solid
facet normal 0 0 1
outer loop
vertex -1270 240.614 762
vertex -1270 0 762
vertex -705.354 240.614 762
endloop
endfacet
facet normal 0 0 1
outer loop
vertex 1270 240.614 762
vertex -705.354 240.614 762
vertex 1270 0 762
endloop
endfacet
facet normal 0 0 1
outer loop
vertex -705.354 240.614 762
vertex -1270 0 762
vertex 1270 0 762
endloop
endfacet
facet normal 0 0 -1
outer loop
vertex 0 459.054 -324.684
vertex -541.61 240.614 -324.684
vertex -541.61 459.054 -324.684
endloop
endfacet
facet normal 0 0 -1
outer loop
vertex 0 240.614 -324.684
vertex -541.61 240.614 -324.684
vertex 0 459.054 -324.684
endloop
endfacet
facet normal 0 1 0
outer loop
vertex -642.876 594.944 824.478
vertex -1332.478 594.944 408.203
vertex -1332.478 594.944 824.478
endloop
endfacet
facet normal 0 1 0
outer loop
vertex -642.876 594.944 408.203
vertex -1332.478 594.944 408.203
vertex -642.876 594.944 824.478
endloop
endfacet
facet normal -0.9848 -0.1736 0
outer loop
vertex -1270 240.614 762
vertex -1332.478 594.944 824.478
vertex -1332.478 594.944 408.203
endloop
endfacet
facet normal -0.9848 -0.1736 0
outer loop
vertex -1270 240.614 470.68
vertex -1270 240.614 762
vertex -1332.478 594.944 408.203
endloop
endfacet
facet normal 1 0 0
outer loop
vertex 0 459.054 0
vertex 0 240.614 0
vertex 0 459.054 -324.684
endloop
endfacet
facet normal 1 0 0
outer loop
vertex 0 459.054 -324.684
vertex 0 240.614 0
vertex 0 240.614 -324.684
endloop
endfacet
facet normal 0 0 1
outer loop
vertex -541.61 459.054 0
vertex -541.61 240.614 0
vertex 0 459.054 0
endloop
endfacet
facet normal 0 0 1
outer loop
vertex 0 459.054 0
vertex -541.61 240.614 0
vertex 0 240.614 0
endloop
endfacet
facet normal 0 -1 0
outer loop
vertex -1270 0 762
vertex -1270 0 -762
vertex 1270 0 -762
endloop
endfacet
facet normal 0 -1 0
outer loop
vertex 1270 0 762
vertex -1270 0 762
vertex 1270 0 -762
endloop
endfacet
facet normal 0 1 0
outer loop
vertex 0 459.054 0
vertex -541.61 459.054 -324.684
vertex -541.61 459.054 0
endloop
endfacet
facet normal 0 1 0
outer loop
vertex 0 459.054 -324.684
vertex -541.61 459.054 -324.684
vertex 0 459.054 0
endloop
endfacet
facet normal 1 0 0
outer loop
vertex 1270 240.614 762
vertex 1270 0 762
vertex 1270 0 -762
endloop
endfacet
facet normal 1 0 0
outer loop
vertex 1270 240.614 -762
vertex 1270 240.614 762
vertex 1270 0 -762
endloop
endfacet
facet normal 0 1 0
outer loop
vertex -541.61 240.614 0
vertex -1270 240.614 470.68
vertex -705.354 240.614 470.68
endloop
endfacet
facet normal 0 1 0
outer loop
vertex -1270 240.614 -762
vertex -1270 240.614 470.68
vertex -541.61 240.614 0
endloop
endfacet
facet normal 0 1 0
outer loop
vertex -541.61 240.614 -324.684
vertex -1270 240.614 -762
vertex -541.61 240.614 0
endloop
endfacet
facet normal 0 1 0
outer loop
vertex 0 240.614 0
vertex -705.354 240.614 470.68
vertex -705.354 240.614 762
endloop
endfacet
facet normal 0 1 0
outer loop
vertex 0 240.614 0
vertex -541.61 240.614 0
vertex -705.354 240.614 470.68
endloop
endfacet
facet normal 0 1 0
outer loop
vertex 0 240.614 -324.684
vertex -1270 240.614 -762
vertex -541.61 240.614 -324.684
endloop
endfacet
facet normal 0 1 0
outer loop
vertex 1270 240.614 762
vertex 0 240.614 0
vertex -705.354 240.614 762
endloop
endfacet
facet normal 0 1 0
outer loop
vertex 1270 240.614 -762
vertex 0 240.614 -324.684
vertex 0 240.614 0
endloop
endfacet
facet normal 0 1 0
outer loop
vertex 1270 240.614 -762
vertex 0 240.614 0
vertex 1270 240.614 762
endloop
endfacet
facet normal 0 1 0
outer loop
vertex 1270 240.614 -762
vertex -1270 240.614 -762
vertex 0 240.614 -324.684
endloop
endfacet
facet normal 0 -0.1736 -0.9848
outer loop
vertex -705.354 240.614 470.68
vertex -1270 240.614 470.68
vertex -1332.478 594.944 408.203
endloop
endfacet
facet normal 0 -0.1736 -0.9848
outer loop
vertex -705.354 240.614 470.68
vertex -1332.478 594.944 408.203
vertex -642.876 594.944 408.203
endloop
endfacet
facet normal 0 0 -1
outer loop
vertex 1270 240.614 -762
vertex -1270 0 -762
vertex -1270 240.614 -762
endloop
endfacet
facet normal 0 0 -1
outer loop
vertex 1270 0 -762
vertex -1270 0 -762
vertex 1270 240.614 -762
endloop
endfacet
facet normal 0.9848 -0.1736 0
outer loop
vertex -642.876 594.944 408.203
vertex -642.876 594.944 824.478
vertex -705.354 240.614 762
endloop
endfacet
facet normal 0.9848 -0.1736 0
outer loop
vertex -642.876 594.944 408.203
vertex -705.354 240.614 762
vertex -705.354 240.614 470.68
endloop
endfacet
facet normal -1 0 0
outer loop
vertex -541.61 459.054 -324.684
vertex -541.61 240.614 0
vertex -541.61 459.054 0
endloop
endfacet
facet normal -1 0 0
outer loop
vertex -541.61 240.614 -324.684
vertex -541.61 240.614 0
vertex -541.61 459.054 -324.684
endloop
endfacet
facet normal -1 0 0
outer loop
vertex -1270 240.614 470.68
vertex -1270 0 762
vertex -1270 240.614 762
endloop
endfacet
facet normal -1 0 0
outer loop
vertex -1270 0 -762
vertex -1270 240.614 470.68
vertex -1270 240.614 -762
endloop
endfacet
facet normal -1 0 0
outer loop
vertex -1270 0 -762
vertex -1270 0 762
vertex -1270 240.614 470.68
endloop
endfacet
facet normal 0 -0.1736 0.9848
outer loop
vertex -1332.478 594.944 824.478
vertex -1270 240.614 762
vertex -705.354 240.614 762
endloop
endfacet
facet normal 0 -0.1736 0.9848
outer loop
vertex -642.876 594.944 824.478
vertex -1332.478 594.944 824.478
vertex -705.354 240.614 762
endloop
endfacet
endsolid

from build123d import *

# Parameters (mm, degrees)
SKETCH3_W           = 2540
SKETCH3_H           = 1524
BOSS_EXTRUDE3_DEPTH = 240.614231141
SKETCH4_W           = 564.645959203
SKETCH4_H           = 291.319549464
BOSS_EXTRUDE4_DEPTH = 354.33
BOSS_EXTRUDE4_DRAFT = -10
SKETCH9_W           = 541.61009367
SKETCH9_H           = 324.683710249
BOSS_EXTRUDE5_DEPTH = 218.44


with BuildPart() as part:
    # Sketch3 → Boss-Extrude3 (new body)
    with BuildSketch(Plane(origin=(0, 0, 0), x_dir=(1, 0, 0), z_dir=(0, 1, 0))):
        Rectangle(SKETCH3_W, SKETCH3_H)
    extrude(amount=BOSS_EXTRUDE3_DEPTH)


with BuildPart() as boss_extrude4_tool:
    # Sketch4 → Boss-Extrude4 (with draft: the straight prism first)
    with BuildSketch(Plane(origin=(0, 240.614231141, 0), x_dir=(1, 0, 0), z_dir=(0, 1, 0))):
        with Locations((-987.677020398, -616.340225268)):
            Rectangle(SKETCH4_W, SKETCH4_H)
    extrude(amount=BOSS_EXTRUDE4_DEPTH)
    # Boss-Extrude4: the draft: its side faces are tilted about the plane it starts from
    boss_extrude4_sides = [boss_extrude4_tool.faces().sort_by_distance(p)[0] for p in [
        (-987.677020399, 417.779231141, 762),
        (-705.354040797, 417.779231141, 616.340225268),
        (-987.677020399, 417.779231141, 470.680450536),
        (-1270, 417.779231141, 616.340225268),
    ]]
    draft(boss_extrude4_sides, Plane(origin=(0, 240.614231141, 0), x_dir=(1, 0, 0), z_dir=(0, 1, 0)), BOSS_EXTRUDE4_DRAFT)


with BuildPart() as part_1:
    add(part.part)

    # Boss-Extrude4: add boss_extrude4_tool
    add(boss_extrude4_tool.part)

    # Sketch9 → Boss-Extrude5 (add)
    with BuildSketch(Plane(origin=(0, 240.614231141, 0), x_dir=(1, 0, 0), z_dir=(0, 1, 0))):
        with Locations((-270.805046835, 162.341855125)):
            Rectangle(SKETCH9_W, SKETCH9_H)
    extrude(amount=BOSS_EXTRUDE5_DEPTH)


solid = part_1.part
